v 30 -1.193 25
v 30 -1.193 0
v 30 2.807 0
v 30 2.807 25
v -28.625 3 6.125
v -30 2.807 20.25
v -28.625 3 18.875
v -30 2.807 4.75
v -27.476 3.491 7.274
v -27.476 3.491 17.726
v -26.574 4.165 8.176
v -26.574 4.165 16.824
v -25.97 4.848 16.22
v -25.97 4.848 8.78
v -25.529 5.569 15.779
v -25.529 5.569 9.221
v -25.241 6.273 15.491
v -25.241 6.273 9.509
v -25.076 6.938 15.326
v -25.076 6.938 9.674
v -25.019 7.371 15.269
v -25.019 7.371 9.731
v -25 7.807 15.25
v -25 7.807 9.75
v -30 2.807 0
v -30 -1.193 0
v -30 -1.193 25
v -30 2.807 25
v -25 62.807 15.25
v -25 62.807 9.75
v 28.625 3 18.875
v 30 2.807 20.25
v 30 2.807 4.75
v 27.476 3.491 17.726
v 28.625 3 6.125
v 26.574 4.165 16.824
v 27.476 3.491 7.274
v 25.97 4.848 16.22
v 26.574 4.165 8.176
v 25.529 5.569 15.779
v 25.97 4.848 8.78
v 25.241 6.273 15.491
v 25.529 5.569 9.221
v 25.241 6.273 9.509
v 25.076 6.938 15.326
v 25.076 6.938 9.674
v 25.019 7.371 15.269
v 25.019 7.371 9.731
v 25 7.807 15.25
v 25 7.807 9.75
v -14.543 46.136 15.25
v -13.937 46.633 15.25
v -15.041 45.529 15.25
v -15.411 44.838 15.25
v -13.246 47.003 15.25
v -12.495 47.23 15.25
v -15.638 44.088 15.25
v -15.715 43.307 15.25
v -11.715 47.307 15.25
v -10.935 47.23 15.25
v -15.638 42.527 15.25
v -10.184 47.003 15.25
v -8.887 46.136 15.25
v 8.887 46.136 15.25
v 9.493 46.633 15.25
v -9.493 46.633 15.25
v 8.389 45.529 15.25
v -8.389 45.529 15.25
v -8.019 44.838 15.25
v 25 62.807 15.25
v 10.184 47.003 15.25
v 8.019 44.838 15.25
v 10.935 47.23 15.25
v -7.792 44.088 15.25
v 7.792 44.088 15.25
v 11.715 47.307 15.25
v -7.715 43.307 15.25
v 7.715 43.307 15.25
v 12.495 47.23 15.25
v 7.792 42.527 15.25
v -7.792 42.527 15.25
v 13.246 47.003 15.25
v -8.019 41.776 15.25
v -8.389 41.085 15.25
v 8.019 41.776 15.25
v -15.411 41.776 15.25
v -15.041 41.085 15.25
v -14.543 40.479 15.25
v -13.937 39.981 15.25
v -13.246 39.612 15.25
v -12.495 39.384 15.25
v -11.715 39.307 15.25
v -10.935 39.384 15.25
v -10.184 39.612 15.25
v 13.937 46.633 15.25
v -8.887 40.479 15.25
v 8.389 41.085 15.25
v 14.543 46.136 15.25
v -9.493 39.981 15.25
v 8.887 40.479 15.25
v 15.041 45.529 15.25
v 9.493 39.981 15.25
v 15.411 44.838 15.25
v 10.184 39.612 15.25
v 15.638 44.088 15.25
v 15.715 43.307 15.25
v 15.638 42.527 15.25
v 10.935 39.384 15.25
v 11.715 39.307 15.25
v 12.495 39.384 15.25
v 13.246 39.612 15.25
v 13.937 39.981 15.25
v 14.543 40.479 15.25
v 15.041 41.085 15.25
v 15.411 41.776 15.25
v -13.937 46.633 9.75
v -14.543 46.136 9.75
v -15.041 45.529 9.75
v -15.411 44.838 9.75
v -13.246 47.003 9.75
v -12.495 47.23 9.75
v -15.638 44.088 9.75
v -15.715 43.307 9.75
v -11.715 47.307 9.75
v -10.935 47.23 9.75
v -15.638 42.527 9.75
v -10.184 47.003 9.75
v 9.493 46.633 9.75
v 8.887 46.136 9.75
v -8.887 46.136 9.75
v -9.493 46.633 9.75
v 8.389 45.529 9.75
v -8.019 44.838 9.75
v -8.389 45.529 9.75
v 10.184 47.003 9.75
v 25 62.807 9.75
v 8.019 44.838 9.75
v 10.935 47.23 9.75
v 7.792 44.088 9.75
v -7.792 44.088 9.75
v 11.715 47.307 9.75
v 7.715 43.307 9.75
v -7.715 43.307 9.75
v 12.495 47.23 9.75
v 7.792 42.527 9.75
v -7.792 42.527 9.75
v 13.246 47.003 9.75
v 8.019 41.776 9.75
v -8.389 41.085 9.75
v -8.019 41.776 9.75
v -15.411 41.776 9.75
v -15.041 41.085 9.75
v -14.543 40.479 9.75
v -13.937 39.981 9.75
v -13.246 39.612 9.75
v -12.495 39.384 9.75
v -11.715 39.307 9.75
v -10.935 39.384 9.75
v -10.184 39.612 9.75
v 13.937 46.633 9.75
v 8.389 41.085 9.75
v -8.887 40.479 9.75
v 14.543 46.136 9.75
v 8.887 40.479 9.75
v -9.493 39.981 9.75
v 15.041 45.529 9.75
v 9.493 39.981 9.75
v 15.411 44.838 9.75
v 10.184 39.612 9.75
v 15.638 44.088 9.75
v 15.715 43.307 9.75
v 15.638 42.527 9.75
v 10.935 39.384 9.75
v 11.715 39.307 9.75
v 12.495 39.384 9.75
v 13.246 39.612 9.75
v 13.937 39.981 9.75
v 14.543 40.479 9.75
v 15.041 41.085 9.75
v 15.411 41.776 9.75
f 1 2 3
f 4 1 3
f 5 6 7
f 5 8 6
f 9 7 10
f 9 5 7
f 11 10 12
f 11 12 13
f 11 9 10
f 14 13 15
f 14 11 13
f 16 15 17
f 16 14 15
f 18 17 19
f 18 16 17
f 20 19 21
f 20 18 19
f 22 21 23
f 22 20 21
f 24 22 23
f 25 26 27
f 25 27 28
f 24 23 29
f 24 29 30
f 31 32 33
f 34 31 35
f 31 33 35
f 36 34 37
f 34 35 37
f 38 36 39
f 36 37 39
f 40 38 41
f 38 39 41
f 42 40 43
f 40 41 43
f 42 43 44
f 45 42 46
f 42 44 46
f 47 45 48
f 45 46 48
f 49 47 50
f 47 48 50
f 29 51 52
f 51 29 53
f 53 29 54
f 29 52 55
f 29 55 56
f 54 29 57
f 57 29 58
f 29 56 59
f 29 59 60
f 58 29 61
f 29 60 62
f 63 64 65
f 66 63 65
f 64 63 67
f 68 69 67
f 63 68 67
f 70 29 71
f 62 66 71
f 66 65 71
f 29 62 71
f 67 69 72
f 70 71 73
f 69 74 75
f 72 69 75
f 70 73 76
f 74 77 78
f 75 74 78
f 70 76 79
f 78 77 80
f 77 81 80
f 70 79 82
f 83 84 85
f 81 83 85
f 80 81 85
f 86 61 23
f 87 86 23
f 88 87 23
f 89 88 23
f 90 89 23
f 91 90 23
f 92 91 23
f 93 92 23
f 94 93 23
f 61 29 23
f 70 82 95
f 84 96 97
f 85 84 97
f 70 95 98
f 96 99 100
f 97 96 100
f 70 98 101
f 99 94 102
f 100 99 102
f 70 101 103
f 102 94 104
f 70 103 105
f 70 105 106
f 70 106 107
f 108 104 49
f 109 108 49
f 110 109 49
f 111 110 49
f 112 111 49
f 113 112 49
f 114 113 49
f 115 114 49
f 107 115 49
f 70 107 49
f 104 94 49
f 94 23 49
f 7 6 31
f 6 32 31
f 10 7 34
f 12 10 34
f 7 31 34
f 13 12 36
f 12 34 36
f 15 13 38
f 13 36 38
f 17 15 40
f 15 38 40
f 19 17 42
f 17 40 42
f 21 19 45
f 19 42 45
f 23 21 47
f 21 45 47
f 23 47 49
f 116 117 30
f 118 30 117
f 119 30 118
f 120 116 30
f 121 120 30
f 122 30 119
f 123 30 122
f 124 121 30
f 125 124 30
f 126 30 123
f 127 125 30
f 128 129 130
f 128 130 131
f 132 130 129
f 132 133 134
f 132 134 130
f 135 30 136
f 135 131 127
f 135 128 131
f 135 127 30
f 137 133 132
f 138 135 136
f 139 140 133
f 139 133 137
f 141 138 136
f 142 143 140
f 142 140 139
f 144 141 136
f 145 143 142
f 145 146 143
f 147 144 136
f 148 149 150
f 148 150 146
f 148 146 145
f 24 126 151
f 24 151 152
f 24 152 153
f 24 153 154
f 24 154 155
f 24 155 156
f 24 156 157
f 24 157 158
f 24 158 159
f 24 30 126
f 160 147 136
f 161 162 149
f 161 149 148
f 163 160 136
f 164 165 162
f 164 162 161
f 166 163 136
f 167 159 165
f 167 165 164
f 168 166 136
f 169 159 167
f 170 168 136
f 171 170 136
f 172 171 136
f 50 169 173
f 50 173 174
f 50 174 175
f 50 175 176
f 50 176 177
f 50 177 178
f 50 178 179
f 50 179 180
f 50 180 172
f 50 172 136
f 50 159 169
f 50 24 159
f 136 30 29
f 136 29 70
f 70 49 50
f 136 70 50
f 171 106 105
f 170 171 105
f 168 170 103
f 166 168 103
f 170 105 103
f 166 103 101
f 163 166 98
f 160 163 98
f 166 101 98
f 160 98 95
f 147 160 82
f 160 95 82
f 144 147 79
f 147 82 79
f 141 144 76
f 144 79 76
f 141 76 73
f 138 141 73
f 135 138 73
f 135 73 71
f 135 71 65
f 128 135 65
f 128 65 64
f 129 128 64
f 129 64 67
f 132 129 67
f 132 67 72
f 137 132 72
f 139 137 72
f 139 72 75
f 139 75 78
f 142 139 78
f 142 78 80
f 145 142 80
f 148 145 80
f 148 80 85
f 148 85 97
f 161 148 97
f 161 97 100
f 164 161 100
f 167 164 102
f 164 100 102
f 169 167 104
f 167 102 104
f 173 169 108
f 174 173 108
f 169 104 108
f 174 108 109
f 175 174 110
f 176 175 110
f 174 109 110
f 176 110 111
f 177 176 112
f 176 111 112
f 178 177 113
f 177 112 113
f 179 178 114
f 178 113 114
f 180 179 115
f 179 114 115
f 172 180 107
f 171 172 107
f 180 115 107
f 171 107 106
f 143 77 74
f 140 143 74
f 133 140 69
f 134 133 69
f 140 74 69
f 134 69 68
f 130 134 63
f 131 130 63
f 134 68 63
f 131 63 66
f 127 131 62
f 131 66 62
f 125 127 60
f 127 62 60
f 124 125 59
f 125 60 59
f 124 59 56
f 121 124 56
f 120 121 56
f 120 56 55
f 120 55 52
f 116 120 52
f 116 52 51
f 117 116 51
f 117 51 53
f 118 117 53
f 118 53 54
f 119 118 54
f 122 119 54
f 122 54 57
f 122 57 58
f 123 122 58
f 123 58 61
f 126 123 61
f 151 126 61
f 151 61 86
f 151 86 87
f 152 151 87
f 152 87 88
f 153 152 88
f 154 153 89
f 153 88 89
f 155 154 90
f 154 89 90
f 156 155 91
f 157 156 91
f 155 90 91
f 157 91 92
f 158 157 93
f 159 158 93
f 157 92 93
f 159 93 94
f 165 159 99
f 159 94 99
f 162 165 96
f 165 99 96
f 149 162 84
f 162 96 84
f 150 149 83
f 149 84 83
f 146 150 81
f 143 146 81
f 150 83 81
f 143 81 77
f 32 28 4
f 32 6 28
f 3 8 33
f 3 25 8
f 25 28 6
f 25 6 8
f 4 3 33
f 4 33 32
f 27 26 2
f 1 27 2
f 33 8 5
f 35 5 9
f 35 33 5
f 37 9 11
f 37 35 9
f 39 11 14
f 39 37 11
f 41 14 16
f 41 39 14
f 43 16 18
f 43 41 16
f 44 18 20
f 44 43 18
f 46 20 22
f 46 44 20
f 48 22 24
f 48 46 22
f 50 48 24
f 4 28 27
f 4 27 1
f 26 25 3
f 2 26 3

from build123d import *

# Parameters (mm, degrees)
SKETCH1_W           = 60
SKETCH1_H           = 4
BOSS_EXTRUDE1_DEPTH = 25
SKETCH2_W           = 50
SKETCH2_H           = 5.5
BOSS_EXTRUDE2_DEPTH = 60
FILLET1_R           = 5
SKETCH3_R           = 4
CUT_EXTRUDE1_DEPTH  = 60


with BuildPart() as part:
    # Sketch1 → Boss-Extrude1 (new body)
    with BuildSketch(Plane.XY):
        with Locations((0, 0.807157058)):
            Rectangle(SKETCH1_W, SKETCH1_H)
    extrude(amount=BOSS_EXTRUDE1_DEPTH)

    # Sketch2 → Boss-Extrude2 (add)
    with BuildSketch(Plane(origin=(0, 2.807157058, 0), x_dir=(1, 0, 0), z_dir=(0, 1, 0))):
        with Locations((0, -12.5)):
            Rectangle(SKETCH2_W, SKETCH2_H)
    extrude(amount=BOSS_EXTRUDE2_DEPTH)

    # Fillet1
    fillet1_edges = [part.edges().sort_by_distance(p)[0] for p in [
        (25, 2.807157058, 12.5),
        (0, 2.807157058, 9.75),
        (-25, 2.807157058, 12.5),
        (0, 2.807157058, 15.25),
    ]]
    fillet(fillet1_edges, radius=FILLET1_R - 0.0001)  # a hair under: the kernel refuses the full size

    # Sketch3 → Cut-Extrude1 (cut)
    with BuildSketch(Plane.XY.offset(15.25)):
        with Locations((-11.715, 43.307157058)):
            Circle(SKETCH3_R)
        with Locations((11.715, 43.307157058)):
            Circle(SKETCH3_R)
    extrude(amount=-CUT_EXTRUDE1_DEPTH, mode=Mode.SUBTRACT)


solid = part.part
